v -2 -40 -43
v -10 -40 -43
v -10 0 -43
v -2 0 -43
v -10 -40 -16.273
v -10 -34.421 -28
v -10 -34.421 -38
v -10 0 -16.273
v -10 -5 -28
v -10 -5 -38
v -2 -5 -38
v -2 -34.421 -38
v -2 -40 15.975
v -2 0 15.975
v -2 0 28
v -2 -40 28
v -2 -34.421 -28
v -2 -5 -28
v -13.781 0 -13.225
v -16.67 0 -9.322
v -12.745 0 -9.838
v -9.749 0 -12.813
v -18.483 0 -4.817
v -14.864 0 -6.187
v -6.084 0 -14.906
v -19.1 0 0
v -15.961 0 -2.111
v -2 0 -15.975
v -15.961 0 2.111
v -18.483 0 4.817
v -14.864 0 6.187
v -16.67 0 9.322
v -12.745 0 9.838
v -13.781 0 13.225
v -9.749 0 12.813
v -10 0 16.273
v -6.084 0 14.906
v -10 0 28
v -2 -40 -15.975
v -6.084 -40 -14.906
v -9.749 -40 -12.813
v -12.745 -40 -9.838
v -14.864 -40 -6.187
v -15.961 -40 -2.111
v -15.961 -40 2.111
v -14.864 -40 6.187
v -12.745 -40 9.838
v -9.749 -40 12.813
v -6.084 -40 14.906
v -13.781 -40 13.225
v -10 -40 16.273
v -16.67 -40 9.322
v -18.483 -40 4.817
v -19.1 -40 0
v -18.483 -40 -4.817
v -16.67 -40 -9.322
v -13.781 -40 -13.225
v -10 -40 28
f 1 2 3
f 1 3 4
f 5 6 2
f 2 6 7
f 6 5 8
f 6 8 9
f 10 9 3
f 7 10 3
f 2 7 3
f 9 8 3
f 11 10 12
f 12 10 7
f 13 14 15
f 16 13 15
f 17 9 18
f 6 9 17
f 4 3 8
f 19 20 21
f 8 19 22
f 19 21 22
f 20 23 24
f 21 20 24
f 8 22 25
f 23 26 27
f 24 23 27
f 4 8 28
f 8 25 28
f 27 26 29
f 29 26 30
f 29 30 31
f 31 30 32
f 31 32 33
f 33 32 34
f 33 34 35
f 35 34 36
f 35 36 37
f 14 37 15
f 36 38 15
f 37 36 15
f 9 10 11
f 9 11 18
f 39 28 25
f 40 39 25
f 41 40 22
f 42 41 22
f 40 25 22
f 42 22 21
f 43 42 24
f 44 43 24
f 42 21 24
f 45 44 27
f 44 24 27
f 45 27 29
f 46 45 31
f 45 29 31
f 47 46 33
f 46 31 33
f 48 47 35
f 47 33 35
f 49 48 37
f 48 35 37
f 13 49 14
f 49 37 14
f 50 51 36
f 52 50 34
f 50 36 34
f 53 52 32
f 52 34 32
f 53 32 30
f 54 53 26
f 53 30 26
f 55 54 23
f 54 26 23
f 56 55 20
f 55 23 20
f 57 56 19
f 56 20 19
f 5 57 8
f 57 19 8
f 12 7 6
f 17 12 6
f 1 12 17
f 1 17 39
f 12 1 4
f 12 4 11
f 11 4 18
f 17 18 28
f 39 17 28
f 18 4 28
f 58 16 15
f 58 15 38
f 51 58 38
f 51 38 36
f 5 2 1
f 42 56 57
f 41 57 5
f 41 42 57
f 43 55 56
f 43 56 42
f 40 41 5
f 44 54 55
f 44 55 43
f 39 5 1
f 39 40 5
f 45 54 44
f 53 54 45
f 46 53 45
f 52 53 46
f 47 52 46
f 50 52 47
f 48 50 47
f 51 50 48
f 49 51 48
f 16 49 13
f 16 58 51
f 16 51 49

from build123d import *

# Parameters (mm, degrees)
F1_DEPTH = 40
F2_W     = 29.421238
F2_H     = 10
F3_DEPTH = 8.001


with BuildPart() as f1:
    # F0 (on Front) → F1 (new body)
    with BuildSketch(Plane.XZ):
        with BuildLine():
            ThreePointArc((-2, -15.975293), (-16.1, 0), (-2, 15.975293))
            Line((-2, 15.975293), (-2, 28))
            Line((-2, 28), (-10, 28))
            Line((-10, 28), (-10, 16.272984))
            ThreePointArc((-10, 16.272984), (-19.1, 0), (-10, -16.272984))
            Line((-10, -16.272984), (-10, -28))
            Line((-10, -28), (-10, -43))
            Line((-10, -43), (-2, -43))
            Line((-2, -43), (-2, -28))
            Line((-2, -28), (-2, -15.975293))
        make_face()
    extrude(amount=F1_DEPTH)

    # F2 (on face) → F3 (cut, through all)
    with BuildSketch(Plane(origin=(-10, 0, 0), x_dir=(0, -1, 0), z_dir=(-1, 0, 0))):
        with Locations((19.710619, -33)):
            Rectangle(F2_W, F2_H)
    extrude(amount=-F3_DEPTH, mode=Mode.SUBTRACT)


solid = f1.part
